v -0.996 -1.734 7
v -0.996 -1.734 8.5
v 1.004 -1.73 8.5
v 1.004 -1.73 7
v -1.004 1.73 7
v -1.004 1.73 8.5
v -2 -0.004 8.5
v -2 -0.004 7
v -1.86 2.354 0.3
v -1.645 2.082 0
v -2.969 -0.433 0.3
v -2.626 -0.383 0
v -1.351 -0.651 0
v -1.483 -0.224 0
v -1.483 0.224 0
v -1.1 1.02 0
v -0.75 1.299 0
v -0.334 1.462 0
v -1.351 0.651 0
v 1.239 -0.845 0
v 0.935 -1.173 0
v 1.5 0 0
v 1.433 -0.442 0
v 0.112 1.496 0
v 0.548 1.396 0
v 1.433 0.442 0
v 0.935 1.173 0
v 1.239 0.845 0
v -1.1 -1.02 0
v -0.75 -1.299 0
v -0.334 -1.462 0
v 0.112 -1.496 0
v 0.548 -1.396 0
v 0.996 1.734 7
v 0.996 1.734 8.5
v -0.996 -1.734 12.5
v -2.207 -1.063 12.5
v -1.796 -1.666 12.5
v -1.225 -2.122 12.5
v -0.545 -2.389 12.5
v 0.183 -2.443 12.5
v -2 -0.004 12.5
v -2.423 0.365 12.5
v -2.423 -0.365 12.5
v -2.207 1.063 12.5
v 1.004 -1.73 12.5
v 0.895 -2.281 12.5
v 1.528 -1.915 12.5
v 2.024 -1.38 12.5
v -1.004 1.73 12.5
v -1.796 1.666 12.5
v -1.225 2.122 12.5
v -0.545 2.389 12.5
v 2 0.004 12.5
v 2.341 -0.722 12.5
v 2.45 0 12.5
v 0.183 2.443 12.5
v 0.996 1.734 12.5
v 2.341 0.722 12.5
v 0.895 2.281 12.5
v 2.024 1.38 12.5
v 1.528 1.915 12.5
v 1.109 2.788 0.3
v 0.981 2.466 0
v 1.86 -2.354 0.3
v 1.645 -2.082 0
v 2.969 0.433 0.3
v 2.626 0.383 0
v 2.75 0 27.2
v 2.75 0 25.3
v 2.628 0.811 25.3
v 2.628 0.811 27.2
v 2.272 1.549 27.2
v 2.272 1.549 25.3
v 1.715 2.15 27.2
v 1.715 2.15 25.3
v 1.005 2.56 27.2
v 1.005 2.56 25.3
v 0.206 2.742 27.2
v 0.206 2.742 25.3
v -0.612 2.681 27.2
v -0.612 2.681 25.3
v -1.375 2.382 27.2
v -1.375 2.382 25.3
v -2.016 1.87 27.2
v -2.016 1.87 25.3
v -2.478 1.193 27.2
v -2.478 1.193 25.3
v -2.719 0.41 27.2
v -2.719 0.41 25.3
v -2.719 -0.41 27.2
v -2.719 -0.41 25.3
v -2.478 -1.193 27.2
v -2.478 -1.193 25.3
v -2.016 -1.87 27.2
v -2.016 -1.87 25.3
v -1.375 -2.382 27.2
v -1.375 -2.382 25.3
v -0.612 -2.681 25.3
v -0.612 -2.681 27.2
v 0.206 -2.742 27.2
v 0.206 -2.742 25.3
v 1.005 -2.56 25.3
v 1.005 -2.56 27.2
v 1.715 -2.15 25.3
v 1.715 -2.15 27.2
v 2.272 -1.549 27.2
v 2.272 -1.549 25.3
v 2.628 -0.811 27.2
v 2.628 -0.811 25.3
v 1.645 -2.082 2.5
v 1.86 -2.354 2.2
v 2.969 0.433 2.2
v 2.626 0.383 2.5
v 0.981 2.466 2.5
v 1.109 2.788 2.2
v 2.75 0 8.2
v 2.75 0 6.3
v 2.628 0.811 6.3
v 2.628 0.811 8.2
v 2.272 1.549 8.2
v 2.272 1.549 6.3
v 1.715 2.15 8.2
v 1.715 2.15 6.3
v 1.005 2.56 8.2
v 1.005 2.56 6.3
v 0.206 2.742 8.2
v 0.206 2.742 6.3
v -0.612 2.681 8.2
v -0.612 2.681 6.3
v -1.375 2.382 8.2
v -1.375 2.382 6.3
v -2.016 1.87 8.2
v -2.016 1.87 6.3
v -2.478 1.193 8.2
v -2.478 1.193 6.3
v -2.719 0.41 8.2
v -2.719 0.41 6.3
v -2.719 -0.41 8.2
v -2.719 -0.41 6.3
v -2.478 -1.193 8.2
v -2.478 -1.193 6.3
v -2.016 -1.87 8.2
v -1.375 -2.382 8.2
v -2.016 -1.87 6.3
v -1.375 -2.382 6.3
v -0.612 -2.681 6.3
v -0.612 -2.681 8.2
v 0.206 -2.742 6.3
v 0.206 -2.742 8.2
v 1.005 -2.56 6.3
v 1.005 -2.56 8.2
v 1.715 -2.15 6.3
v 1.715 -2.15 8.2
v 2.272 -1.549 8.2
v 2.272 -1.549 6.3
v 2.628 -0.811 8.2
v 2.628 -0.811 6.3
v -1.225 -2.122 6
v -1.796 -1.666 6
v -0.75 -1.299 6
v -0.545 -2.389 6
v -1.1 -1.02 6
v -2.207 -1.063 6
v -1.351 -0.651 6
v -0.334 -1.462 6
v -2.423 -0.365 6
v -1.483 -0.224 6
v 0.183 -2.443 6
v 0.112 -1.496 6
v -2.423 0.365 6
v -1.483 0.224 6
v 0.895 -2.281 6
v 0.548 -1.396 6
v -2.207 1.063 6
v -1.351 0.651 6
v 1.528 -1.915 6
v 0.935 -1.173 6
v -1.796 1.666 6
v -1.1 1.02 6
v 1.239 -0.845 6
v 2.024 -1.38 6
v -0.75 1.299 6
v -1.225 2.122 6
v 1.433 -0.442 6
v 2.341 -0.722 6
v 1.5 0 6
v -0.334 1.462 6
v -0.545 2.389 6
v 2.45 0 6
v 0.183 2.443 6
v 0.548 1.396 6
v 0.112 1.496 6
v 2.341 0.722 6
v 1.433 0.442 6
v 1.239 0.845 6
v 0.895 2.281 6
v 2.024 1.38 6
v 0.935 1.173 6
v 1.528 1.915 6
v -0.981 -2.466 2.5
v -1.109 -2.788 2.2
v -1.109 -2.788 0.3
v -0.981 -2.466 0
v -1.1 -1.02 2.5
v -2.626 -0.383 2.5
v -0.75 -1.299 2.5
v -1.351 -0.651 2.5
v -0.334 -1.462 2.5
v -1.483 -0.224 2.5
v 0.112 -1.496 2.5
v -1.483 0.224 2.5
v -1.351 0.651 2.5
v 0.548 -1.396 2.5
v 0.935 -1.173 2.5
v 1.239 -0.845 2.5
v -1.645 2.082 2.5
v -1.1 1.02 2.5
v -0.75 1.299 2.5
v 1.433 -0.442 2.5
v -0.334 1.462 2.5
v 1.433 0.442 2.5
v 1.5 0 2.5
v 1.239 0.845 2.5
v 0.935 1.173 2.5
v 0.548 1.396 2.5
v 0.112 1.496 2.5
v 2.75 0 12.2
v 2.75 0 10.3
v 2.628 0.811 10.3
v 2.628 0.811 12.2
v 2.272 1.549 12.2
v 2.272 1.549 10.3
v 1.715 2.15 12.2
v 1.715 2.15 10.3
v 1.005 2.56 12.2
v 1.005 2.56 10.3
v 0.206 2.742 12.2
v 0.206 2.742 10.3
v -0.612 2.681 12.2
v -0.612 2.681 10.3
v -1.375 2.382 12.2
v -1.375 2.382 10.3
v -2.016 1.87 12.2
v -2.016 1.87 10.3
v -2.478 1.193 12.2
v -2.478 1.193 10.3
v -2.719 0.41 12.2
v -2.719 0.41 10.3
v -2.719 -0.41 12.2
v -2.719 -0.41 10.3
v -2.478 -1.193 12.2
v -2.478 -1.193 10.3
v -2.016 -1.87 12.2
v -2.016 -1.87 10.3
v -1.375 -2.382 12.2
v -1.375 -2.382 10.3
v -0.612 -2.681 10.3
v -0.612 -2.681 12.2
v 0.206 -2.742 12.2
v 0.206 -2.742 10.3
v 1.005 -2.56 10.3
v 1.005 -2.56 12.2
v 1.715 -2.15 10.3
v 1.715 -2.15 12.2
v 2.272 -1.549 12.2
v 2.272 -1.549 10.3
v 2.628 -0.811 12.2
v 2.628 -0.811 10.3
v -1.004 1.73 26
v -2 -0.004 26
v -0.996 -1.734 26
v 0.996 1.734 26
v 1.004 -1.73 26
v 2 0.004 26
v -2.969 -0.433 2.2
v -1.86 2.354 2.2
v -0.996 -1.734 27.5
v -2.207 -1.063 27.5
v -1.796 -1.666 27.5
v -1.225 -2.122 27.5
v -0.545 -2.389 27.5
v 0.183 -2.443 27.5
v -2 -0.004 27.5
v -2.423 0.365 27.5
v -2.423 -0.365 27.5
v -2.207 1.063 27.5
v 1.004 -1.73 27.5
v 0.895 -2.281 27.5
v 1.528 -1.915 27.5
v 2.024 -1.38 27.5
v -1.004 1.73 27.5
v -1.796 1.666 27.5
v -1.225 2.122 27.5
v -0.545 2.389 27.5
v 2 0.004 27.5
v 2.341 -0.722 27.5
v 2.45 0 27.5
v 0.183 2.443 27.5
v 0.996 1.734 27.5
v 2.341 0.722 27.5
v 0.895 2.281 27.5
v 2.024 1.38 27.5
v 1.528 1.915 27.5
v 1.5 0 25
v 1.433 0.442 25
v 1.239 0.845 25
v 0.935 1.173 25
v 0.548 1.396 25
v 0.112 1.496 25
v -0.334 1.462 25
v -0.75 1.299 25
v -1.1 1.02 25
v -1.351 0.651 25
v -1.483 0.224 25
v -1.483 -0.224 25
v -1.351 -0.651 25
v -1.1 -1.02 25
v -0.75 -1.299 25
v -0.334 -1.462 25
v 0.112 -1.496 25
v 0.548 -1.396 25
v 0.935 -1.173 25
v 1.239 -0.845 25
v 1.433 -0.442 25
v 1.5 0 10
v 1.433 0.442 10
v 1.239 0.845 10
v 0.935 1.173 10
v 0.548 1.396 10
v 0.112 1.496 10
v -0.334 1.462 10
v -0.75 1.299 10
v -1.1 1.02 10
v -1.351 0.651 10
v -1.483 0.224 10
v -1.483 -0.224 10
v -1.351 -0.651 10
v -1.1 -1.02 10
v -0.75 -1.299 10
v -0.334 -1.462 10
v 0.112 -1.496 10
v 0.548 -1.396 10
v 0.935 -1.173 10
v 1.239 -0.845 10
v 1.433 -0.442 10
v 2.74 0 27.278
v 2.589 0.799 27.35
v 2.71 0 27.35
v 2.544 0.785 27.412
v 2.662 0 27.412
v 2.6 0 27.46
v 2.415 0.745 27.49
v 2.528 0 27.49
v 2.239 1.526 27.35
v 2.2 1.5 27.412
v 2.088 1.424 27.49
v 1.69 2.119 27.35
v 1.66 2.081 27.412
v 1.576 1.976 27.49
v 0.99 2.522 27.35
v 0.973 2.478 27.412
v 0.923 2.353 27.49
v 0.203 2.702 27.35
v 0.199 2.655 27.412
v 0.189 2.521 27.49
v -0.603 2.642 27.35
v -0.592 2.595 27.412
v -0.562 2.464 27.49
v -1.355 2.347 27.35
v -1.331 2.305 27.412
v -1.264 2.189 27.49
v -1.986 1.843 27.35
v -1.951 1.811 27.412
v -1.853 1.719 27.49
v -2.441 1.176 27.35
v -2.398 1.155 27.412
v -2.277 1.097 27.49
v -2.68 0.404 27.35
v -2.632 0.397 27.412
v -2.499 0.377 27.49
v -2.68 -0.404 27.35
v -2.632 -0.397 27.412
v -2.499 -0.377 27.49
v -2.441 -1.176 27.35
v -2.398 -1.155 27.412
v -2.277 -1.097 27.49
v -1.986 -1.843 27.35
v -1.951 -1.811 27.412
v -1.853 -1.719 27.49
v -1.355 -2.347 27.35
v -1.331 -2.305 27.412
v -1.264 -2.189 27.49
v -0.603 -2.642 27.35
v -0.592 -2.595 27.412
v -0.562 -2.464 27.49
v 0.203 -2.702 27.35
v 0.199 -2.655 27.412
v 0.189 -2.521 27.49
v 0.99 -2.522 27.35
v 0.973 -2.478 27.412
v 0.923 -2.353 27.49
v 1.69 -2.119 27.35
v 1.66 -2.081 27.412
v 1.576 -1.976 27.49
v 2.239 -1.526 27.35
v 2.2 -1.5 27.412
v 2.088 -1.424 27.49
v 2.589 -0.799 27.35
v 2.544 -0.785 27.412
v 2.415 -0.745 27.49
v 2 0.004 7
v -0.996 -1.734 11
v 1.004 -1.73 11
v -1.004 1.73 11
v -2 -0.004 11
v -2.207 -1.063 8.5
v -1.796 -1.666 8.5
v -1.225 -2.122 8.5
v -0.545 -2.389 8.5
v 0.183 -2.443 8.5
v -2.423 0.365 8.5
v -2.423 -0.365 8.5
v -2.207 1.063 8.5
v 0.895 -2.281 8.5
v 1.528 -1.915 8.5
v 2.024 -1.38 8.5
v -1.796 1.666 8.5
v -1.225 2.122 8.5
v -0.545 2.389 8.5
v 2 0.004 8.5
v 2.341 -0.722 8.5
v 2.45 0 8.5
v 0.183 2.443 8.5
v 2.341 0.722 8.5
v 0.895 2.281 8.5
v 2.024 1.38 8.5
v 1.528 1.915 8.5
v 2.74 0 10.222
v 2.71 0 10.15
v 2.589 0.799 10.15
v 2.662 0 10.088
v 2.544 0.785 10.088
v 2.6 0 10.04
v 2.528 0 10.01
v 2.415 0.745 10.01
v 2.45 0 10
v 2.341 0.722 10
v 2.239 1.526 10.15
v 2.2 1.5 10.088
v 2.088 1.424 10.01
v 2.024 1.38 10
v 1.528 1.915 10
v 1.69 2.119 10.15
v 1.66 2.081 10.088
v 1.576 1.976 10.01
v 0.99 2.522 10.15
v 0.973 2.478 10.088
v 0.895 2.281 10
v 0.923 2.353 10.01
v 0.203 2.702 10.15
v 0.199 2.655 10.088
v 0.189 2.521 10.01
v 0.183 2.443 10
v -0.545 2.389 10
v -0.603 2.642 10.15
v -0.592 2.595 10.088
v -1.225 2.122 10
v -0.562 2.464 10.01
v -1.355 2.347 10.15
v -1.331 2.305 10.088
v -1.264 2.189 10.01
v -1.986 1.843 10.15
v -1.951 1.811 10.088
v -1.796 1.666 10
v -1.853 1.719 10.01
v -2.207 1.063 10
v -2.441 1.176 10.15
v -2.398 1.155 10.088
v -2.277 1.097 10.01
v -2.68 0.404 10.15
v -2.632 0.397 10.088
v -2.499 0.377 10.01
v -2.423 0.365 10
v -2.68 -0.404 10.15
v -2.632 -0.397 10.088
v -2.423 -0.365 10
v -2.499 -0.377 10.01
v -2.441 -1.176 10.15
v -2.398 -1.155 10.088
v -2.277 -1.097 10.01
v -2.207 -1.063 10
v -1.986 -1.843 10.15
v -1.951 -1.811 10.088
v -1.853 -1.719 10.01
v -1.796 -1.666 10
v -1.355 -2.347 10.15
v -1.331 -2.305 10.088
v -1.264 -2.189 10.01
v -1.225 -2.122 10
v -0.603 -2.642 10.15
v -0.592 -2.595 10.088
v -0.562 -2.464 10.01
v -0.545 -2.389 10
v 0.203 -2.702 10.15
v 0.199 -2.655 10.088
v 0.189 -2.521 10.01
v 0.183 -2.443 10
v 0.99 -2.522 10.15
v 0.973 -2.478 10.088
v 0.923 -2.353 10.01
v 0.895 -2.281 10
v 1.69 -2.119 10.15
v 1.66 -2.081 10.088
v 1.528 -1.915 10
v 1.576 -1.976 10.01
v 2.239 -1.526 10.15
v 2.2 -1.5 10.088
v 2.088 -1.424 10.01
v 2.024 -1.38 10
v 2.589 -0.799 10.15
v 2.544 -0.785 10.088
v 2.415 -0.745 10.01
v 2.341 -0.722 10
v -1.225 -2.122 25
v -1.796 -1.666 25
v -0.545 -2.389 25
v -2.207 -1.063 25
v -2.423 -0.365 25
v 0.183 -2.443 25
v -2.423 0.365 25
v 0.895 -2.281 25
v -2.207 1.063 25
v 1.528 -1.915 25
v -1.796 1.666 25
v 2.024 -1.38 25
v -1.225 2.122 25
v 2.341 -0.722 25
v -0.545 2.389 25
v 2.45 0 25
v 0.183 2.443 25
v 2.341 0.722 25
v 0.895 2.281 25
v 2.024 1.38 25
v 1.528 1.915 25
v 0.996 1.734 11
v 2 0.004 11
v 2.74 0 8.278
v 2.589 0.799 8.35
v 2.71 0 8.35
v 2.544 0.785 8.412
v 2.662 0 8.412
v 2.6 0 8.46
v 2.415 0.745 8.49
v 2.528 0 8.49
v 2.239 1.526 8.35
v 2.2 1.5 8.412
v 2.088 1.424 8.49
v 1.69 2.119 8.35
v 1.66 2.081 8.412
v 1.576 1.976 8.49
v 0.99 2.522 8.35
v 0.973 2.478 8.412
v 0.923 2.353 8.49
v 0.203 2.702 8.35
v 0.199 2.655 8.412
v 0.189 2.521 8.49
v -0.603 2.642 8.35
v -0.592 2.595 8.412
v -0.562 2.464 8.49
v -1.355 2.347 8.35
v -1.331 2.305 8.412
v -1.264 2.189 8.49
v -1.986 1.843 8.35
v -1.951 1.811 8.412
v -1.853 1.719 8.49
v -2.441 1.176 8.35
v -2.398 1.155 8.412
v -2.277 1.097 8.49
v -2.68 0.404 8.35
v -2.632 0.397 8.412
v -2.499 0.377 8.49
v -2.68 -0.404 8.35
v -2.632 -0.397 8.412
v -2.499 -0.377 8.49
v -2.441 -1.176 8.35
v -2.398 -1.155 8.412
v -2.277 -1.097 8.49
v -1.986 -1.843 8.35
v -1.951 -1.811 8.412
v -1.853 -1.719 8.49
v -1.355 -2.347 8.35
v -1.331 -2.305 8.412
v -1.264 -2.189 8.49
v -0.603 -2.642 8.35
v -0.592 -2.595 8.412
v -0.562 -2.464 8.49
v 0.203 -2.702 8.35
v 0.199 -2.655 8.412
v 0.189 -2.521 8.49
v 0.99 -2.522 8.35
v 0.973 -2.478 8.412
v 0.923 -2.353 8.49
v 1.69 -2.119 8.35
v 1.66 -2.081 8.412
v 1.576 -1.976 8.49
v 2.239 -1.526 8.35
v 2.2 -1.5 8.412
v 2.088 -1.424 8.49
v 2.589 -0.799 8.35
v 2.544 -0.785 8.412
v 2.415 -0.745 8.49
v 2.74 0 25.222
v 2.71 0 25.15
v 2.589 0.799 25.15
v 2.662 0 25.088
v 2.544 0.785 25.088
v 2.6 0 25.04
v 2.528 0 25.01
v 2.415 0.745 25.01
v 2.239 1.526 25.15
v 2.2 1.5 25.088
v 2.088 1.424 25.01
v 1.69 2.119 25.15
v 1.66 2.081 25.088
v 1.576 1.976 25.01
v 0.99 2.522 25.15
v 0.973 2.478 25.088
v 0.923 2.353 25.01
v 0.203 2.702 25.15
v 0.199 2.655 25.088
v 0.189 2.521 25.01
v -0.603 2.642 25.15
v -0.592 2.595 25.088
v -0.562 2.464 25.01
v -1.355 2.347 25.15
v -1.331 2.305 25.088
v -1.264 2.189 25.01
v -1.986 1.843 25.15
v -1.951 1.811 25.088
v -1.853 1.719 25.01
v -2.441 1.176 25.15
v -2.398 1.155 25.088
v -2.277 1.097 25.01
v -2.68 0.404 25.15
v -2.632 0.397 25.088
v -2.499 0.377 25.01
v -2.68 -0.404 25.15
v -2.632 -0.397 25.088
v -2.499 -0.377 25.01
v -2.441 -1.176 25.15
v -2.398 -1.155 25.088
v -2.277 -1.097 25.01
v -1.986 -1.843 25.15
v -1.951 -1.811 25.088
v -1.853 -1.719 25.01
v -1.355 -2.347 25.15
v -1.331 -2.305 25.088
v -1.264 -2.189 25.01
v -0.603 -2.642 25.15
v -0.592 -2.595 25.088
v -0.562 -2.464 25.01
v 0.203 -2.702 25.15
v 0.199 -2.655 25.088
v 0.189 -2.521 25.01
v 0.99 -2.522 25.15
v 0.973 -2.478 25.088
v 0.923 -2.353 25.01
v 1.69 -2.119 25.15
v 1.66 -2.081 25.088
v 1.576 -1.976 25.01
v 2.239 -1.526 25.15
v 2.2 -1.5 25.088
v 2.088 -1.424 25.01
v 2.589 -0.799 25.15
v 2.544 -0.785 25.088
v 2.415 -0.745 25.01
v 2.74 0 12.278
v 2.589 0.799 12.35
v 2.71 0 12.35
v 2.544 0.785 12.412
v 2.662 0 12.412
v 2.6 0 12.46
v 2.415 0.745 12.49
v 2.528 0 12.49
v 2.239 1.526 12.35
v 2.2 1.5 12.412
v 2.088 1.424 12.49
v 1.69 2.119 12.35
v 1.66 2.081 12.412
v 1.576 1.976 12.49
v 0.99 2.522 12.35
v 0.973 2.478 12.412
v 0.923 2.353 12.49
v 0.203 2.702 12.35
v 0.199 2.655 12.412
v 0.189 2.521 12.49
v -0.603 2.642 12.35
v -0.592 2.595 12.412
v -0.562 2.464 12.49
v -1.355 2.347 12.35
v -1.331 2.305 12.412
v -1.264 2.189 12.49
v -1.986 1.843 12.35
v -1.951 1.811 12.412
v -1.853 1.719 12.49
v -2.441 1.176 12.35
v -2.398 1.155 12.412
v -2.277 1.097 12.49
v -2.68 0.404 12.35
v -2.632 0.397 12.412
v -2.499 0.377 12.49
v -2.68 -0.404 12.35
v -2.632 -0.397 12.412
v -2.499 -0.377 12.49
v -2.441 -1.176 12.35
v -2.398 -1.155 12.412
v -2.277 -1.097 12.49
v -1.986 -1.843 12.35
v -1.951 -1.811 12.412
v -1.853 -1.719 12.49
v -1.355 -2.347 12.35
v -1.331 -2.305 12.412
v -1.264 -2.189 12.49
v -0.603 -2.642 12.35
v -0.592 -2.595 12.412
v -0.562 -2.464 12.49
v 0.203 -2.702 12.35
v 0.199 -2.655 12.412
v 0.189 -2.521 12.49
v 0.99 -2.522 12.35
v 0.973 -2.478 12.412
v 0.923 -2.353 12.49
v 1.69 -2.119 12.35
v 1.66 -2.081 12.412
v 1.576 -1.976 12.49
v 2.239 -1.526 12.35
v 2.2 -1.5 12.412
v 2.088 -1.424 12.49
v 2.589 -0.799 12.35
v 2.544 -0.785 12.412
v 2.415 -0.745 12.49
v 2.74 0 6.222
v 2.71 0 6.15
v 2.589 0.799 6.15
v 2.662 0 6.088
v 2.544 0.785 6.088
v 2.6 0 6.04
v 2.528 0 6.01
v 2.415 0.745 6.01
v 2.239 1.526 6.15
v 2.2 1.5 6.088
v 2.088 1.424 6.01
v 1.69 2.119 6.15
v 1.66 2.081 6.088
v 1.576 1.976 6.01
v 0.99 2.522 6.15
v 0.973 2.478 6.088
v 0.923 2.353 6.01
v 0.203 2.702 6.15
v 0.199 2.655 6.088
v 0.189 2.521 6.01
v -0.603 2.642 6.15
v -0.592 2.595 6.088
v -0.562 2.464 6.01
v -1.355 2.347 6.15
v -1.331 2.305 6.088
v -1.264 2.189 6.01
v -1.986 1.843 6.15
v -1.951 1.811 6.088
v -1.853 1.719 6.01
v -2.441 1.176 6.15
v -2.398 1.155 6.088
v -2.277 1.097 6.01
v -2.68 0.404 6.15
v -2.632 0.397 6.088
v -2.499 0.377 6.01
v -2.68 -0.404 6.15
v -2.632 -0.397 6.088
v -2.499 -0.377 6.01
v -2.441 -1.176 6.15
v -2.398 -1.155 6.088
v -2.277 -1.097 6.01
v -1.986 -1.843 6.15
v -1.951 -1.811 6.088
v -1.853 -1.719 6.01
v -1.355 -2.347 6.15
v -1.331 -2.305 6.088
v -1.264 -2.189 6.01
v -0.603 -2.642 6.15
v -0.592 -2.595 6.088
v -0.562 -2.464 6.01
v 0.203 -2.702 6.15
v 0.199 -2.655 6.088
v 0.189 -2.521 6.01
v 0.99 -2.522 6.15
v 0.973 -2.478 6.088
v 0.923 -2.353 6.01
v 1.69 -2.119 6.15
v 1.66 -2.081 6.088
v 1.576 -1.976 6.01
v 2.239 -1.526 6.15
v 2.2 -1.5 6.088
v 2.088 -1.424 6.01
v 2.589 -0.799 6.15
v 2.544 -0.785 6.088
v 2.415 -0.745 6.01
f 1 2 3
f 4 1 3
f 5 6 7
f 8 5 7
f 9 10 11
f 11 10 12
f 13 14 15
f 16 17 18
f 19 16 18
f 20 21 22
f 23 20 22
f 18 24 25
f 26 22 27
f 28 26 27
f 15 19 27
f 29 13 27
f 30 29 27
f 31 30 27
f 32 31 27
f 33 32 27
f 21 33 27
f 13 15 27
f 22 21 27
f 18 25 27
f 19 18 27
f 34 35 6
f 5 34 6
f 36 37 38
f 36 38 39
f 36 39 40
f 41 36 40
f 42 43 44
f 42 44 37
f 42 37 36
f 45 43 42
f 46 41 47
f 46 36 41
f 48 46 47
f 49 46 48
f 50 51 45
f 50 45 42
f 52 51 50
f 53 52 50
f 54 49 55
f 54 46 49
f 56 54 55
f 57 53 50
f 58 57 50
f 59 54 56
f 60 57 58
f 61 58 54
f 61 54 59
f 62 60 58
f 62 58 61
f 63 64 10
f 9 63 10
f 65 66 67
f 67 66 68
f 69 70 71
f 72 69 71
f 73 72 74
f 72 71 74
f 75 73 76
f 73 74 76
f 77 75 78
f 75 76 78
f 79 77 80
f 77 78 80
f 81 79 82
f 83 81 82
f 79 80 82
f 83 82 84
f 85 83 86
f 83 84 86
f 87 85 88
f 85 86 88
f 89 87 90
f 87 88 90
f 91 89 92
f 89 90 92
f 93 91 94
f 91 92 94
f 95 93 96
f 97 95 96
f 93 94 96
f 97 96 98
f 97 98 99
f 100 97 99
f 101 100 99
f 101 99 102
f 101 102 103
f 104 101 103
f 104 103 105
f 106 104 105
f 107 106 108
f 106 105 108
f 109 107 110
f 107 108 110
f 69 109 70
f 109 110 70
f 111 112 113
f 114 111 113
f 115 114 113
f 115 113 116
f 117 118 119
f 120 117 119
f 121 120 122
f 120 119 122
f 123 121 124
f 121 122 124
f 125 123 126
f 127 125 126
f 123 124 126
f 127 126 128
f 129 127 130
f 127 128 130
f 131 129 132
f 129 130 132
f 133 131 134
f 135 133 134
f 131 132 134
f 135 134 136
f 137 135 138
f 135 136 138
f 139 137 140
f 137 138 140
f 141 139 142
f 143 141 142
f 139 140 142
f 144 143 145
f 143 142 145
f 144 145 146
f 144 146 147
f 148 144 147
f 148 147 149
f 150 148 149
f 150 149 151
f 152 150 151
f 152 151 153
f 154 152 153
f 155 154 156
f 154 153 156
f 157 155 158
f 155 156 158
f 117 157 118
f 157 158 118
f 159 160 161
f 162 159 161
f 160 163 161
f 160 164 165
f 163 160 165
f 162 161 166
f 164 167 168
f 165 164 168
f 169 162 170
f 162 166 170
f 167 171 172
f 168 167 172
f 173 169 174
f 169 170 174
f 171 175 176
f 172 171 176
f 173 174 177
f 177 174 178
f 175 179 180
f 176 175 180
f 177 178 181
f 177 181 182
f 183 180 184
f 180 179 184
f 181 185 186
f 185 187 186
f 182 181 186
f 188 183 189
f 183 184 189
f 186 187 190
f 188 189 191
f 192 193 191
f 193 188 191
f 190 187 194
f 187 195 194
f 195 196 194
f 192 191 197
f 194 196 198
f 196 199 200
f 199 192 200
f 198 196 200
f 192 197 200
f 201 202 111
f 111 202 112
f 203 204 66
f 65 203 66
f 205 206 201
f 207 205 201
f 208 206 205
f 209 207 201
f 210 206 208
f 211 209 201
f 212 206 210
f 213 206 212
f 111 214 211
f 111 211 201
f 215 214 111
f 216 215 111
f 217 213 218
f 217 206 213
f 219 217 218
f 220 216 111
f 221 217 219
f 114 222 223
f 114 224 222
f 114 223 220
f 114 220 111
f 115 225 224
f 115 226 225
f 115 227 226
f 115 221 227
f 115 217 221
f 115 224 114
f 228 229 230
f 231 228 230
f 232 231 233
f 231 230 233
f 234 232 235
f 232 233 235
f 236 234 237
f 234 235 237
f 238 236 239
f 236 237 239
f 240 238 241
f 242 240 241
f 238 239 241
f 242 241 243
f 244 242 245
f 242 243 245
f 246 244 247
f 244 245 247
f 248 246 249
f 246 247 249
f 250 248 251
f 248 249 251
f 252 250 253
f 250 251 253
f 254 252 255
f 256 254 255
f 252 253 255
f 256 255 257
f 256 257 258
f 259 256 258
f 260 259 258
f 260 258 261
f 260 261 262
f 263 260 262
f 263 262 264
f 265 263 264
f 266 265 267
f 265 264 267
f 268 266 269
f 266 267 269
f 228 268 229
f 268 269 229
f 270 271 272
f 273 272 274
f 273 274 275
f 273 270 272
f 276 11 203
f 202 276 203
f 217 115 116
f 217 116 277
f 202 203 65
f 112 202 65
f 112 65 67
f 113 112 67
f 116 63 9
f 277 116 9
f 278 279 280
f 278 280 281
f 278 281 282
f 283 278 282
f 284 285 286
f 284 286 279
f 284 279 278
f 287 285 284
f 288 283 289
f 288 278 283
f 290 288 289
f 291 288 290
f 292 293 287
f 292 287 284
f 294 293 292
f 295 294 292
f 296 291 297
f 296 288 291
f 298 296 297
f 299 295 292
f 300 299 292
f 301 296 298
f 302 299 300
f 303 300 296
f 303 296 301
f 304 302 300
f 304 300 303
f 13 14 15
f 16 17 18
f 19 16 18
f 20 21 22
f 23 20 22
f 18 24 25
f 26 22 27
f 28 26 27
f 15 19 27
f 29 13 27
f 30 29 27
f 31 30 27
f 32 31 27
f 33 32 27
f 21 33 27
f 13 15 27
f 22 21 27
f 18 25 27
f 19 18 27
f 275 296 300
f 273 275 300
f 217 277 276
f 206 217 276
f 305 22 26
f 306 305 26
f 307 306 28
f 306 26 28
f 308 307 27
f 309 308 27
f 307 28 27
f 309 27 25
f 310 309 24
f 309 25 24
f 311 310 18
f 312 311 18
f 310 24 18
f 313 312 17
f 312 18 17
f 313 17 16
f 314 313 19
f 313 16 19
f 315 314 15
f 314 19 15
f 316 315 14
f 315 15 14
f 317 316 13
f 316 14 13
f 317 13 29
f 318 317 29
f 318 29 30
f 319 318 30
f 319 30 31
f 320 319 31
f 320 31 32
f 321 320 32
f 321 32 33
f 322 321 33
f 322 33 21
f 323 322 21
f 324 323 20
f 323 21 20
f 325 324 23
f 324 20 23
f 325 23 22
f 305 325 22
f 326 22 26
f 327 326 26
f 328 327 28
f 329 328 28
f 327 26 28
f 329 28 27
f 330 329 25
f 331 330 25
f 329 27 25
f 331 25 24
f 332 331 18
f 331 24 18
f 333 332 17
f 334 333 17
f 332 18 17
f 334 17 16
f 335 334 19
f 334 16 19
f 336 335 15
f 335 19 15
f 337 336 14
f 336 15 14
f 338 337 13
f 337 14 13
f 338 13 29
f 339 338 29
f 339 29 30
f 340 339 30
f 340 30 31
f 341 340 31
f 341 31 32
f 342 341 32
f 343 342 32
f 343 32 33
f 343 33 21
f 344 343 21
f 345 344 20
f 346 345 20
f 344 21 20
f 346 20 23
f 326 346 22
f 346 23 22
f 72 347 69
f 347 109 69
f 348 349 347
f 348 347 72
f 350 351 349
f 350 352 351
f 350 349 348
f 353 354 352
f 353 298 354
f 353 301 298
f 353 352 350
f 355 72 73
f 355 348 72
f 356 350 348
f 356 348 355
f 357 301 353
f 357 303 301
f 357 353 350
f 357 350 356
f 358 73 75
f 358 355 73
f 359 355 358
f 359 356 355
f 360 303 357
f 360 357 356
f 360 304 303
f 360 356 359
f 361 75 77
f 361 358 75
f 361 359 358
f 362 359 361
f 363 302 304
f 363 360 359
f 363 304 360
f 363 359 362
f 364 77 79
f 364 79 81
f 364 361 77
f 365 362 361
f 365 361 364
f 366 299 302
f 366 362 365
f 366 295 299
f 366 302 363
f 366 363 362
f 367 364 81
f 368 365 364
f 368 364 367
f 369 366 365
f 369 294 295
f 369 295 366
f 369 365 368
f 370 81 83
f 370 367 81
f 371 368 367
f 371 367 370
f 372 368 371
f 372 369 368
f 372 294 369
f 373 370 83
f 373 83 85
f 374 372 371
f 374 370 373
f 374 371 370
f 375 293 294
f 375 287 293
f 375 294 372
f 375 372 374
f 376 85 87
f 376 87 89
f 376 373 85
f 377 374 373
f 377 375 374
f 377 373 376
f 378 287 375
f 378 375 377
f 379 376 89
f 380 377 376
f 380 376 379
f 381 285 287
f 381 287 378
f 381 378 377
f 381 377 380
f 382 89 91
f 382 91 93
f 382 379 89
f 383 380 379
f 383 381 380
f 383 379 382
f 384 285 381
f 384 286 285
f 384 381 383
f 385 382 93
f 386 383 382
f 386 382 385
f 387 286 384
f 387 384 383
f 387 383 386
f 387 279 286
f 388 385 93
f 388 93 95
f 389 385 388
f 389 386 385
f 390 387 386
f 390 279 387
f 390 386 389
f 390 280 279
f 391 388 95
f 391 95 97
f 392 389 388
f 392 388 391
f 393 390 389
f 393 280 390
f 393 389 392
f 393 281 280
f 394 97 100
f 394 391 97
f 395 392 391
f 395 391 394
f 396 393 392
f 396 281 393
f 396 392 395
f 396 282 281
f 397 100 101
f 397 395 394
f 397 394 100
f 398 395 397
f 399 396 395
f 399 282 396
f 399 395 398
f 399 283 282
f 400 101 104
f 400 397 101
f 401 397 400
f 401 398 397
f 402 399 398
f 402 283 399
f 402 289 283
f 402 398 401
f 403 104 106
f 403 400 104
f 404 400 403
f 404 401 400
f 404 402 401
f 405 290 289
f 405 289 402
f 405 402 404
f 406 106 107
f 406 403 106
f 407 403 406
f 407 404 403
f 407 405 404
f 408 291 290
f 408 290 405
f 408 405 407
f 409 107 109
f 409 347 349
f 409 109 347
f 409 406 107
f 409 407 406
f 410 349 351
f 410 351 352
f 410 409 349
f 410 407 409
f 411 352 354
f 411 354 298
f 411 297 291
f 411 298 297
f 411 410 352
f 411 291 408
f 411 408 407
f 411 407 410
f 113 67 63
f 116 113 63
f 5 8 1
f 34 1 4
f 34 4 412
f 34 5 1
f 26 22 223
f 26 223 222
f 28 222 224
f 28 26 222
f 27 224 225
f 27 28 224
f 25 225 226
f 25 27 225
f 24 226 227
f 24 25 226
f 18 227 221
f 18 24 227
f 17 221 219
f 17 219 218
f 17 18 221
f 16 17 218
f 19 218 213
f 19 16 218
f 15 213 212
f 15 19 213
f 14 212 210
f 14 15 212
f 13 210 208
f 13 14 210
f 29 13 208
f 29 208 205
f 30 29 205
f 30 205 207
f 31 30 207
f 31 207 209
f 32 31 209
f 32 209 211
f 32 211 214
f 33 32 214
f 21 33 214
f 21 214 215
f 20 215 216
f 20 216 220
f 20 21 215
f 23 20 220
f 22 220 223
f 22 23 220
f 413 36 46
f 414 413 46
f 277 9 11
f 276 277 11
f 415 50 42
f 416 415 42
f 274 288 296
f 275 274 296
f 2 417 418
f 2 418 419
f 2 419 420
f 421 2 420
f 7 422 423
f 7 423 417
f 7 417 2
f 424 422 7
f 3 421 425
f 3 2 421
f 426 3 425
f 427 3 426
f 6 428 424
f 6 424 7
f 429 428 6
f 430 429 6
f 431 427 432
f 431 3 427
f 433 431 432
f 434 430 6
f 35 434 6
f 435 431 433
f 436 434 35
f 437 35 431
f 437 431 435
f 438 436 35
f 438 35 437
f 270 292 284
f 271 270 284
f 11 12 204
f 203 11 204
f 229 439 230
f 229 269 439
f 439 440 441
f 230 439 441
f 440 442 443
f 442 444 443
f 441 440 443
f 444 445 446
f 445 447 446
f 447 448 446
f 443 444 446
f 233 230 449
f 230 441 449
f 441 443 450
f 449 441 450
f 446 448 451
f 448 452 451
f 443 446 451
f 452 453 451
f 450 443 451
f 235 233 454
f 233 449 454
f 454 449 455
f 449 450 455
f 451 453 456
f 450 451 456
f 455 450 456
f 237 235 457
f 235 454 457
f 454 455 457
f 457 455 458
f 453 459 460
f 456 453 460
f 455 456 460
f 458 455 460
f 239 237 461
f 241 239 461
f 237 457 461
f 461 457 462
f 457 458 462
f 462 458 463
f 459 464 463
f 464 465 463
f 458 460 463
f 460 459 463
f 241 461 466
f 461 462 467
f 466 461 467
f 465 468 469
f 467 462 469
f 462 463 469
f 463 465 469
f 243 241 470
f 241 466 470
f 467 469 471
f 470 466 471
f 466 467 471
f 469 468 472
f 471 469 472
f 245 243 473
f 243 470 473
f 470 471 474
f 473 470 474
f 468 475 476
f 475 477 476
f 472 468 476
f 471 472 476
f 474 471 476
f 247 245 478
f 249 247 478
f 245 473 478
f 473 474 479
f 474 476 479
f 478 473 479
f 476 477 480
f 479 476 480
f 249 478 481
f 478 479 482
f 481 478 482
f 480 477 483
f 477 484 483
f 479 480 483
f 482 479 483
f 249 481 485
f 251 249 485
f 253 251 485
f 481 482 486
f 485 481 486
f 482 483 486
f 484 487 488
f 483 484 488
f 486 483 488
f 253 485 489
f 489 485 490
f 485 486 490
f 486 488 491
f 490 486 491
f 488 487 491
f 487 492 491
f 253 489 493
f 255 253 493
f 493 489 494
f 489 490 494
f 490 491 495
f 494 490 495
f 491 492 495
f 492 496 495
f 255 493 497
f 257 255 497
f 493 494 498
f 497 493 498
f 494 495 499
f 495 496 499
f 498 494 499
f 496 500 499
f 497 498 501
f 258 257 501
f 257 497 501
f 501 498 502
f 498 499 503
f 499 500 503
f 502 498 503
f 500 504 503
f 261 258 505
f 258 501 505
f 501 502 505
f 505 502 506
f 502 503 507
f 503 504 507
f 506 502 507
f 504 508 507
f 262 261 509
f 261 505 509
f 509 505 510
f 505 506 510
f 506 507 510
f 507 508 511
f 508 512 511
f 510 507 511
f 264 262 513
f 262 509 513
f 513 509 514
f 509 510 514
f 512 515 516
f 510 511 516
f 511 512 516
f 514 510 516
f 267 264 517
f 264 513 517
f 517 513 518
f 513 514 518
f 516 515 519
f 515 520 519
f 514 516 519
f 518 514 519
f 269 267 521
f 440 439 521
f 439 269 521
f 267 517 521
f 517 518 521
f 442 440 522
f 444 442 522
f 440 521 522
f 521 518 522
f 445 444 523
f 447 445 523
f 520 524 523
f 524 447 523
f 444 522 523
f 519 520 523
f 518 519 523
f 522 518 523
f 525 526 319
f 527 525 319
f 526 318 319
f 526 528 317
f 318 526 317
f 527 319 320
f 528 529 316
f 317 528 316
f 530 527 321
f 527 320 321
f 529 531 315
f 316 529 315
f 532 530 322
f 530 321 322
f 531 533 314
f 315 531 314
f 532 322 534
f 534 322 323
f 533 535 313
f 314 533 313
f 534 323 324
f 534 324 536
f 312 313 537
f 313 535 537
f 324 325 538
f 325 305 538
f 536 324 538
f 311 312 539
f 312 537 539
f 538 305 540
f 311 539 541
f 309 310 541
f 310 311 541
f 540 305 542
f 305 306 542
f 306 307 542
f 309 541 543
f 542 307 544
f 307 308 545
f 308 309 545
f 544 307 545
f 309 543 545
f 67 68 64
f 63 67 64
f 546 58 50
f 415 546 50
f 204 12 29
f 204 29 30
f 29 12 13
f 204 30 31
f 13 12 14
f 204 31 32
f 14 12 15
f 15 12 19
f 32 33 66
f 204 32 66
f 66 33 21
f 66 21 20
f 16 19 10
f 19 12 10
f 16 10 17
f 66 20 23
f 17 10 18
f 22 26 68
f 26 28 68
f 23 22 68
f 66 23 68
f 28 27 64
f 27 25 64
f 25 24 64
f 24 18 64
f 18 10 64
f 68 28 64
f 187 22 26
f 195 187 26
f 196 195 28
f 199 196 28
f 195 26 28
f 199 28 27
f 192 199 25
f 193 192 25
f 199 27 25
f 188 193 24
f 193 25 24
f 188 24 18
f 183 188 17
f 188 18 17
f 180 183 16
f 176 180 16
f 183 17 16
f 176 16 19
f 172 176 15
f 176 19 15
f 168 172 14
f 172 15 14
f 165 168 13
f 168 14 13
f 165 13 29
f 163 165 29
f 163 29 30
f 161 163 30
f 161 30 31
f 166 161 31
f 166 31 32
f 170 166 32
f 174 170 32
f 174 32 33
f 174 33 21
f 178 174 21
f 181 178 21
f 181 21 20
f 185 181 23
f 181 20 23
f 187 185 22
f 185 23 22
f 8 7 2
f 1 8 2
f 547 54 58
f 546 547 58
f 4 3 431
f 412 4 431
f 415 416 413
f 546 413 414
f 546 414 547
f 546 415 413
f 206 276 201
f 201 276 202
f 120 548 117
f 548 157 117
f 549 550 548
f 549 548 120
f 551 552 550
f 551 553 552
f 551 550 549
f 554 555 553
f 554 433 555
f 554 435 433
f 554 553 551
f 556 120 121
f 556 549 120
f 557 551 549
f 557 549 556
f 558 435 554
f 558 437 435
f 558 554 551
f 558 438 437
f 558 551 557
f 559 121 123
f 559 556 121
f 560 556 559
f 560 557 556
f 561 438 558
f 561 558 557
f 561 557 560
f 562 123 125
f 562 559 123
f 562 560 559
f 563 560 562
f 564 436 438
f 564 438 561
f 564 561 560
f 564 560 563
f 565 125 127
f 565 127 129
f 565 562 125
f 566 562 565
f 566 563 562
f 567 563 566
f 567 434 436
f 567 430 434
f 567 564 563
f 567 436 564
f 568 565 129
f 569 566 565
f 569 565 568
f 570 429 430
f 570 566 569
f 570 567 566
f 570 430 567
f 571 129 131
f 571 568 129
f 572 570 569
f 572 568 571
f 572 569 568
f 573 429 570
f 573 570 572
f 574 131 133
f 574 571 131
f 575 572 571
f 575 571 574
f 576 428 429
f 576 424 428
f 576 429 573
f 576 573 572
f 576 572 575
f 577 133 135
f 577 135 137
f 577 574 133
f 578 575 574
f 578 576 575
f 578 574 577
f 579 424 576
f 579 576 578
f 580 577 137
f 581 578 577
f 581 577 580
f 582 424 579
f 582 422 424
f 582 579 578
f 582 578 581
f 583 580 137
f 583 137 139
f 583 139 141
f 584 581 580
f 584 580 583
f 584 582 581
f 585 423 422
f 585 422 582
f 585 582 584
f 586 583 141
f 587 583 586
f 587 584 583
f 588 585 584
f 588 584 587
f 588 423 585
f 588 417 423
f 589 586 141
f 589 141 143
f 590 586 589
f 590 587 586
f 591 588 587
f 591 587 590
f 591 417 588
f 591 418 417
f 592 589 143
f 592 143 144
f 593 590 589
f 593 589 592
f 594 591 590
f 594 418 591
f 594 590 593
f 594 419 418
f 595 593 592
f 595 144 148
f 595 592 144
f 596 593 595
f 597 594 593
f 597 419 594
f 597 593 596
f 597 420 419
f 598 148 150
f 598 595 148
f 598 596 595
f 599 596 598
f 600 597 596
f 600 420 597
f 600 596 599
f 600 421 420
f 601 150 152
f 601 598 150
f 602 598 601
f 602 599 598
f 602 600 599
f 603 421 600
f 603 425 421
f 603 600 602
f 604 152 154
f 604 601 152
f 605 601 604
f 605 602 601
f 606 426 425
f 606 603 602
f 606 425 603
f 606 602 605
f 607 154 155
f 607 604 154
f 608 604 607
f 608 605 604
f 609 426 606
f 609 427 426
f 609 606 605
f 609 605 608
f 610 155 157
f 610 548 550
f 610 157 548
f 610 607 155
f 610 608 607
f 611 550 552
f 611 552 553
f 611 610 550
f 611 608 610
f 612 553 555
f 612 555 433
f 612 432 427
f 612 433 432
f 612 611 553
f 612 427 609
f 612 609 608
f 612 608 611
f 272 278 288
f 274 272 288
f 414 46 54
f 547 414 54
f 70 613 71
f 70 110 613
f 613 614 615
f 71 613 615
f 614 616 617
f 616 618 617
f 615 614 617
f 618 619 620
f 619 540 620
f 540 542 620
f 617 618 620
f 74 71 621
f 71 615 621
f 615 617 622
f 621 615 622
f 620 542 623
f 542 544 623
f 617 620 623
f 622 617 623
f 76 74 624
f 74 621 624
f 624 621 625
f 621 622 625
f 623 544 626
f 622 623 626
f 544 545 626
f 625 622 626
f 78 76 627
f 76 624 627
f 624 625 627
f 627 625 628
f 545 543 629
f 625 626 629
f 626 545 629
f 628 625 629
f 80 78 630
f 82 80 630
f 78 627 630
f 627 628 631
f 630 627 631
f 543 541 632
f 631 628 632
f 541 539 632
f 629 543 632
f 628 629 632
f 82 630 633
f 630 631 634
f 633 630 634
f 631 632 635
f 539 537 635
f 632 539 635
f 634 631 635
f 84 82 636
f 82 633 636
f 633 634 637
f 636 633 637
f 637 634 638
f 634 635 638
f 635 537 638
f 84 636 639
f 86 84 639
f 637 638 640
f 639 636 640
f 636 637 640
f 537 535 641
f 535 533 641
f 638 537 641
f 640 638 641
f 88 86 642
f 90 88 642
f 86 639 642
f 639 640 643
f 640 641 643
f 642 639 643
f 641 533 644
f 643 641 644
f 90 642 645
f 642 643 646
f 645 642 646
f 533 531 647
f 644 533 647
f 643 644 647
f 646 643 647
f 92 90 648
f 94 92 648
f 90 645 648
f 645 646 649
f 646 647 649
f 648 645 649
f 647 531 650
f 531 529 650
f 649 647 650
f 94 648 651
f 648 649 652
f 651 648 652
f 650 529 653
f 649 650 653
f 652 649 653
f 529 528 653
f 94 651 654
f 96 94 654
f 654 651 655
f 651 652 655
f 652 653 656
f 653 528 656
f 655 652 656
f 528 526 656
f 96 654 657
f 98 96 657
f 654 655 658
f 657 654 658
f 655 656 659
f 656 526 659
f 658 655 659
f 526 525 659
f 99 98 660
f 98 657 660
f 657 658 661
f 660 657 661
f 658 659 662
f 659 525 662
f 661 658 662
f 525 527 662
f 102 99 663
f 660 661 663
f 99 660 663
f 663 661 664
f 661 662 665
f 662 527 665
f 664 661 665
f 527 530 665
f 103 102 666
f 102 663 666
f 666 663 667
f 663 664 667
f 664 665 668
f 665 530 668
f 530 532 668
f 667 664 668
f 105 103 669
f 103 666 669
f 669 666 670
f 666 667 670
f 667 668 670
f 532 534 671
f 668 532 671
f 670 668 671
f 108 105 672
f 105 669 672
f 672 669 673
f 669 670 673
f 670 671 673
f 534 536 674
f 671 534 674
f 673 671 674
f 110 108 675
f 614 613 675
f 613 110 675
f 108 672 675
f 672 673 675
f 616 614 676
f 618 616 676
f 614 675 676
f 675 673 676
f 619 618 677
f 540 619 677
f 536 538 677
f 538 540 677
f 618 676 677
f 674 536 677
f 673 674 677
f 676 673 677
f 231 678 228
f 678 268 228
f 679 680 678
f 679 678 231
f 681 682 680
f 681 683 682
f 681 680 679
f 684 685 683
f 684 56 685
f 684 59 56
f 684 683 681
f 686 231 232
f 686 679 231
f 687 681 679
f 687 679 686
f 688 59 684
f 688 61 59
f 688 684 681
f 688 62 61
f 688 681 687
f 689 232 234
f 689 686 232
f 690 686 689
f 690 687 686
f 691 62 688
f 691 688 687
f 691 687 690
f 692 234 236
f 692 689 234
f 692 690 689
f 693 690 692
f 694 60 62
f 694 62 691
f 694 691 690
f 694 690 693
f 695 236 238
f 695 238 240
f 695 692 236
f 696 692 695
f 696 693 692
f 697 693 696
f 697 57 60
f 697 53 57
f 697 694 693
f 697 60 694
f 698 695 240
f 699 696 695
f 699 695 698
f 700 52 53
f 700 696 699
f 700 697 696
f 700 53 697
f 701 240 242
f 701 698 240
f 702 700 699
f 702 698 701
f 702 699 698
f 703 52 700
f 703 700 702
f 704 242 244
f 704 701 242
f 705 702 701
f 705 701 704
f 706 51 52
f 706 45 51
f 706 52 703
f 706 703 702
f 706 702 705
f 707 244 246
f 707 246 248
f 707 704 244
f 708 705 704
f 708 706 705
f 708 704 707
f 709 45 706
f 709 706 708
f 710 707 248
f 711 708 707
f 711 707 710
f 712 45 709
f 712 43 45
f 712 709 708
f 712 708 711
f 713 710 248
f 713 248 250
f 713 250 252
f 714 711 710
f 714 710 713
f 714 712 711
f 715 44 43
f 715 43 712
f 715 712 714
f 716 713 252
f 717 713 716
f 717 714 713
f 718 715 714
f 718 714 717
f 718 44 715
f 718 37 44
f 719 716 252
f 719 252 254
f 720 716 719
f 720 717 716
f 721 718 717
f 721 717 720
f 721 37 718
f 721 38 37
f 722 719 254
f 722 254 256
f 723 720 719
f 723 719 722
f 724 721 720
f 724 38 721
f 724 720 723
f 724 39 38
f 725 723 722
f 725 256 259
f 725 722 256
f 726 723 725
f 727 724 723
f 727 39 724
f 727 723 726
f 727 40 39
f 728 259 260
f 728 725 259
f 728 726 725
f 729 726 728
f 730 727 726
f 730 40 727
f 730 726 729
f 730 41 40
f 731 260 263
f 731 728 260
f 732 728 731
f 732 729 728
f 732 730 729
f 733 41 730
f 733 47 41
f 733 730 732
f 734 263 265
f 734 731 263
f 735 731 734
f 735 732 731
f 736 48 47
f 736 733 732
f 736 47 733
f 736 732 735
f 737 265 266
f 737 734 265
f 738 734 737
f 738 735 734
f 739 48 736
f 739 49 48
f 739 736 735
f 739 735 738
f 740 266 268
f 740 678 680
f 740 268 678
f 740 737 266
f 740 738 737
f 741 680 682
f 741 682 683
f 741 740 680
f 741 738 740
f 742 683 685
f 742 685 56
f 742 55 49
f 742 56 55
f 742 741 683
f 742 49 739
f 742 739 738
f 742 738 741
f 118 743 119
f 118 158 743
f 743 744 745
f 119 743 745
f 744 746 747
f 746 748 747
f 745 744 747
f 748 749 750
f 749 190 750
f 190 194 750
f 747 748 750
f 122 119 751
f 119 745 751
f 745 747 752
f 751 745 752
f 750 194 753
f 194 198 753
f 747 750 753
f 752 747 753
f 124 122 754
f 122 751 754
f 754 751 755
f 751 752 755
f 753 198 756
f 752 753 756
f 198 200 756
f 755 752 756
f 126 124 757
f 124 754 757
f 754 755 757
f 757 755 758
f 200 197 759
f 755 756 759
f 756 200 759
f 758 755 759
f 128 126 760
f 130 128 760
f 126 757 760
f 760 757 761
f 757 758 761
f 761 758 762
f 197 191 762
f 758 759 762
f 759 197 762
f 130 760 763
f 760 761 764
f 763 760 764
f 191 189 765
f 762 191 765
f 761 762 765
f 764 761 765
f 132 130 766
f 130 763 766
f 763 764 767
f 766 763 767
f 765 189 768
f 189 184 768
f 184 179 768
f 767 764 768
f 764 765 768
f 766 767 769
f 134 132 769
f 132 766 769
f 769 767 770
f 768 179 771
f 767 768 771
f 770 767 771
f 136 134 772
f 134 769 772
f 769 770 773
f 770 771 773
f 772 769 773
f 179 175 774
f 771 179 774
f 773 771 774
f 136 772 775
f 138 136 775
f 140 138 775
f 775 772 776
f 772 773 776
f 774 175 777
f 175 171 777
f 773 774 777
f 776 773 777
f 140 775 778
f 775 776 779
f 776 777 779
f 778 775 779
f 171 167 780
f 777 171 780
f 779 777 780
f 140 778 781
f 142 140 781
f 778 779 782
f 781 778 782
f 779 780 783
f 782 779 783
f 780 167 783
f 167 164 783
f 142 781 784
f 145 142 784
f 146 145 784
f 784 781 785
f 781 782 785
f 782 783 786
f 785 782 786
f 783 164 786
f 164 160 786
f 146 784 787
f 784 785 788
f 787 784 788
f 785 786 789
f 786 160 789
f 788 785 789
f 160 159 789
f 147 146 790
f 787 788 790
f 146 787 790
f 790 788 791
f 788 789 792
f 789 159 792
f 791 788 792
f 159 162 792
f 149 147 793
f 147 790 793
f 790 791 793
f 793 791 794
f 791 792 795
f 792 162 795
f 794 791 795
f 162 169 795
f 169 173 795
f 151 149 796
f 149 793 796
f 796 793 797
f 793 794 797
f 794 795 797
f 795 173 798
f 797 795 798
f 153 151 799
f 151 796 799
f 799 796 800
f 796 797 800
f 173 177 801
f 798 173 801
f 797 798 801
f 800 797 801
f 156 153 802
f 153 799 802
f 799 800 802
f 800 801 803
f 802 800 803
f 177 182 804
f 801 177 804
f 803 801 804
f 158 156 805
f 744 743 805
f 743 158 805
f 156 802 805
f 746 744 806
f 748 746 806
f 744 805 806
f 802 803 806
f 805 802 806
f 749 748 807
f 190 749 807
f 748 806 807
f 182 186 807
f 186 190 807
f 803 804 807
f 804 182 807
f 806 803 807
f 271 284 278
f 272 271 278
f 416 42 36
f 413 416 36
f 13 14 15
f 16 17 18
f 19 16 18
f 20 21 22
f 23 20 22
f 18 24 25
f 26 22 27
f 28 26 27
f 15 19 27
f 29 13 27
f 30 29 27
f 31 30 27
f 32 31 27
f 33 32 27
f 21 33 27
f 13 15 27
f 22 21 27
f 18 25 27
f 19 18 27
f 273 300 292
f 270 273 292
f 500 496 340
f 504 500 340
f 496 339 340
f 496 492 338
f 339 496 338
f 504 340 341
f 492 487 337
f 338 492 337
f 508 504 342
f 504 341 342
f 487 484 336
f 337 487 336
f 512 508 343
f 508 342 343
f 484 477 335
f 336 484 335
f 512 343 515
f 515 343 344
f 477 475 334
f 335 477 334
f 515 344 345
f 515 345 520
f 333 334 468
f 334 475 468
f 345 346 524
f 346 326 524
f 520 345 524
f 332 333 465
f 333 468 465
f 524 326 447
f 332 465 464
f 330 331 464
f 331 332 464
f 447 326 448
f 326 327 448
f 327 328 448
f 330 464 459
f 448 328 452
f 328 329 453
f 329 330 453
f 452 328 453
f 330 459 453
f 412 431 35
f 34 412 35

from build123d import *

# Parameters (mm, degrees)
SKETCH_R        = 1.5
PAD_DEPTH       = 10
SKETCH001_R     = 2.75
PAD001_DEPTH    = 2.5
POCKET_DEPTH    = 1.5
FILLET_R        = 0.3
SKETCH004_R     = 1.5
PAD002_DEPTH    = 2.5
CHAMFER001_SIZE = 0.3
CHAMFER002_SIZE = 0.3
SKETCH005_R     = 1.5
PAD004_DEPTH    = 6
SKETCH006_R     = 2.75
PAD003_DEPTH    = 2.5
POCKET001_DEPTH = 1.5
FILLET001_R     = 0.3
SKETCH008_R     = 1.5
PAD006_DEPTH    = 25
SKETCH009_R     = 2.75
PAD005_DEPTH    = 2.5
POCKET002_DEPTH = 1.5
FILLET002_R     = 0.3


with BuildPart() as m3_10mm:
    # Sketch → Pad (new body)
    with BuildSketch(Plane.XY):
        Circle(SKETCH_R)
    extrude(amount=PAD_DEPTH)

    # Sketch001 (on Face3 of Pad) → Pad001 (join)
    with BuildSketch(Plane.XY.offset(10)):
        Circle(SKETCH001_R)
    extrude(amount=PAD001_DEPTH)

    # Sketch002 (on Face3 of Pad001) → Pocket (cut)
    with BuildSketch(Plane.XY.offset(12.5)):
        Polygon((1.999996, 0.004094), (0.996452, 1.734094), (-1.003544, 1.73), (-1.999996, -0.004094), (-0.996452, -1.734094), (1.003544, -1.73), align=None)
    extrude(amount=-POCKET_DEPTH, mode=Mode.SUBTRACT)

    # Fillet
    fillet_edges = [m3_10mm.edges().sort_by_distance(p)[0] for p in [
        (-2.75, 0, 12.5),
        (-2.75, 0, 10),
    ]]
    fillet(fillet_edges, radius=FILLET_R)


with BuildPart() as m3_nut:
    # Sketch004 → Pad002 (new body)
    with BuildSketch(Plane.XY):
        Polygon((1.108956, 2.787511), (-1.859577, 2.35414), (-2.968533, -0.433371), (-1.108956, -2.787511), (1.859577, -2.35414), (2.968533, 0.433371), align=None)
        Circle(SKETCH004_R, mode=Mode.SUBTRACT)
    extrude(amount=PAD002_DEPTH)

    # Chamfer001
    chamfer001_edges = [m3_nut.edges().sort_by_distance(p)[0] for p in [
        (-2.038745, -1.610441, 0),
        (0.37531, -2.570825, 0),
        (2.414055, -0.960384, 0),
        (2.038745, 1.610441, 0),
        (-0.37531, 2.570825, 0),
        (-2.414055, 0.960384, 0),
    ]]
    chamfer(chamfer001_edges, length=CHAMFER001_SIZE)

    # Chamfer002
    chamfer002_edges = [m3_nut.edges().sort_by_distance(p)[0] for p in [
        (0.37531, -2.570825, 2.5),
        (-2.038745, -1.610441, 2.5),
        (-2.414055, 0.960384, 2.5),
        (-0.37531, 2.570825, 2.5),
        (2.038745, 1.610441, 2.5),
        (2.414055, -0.960384, 2.5),
    ]]
    chamfer(chamfer002_edges, length=CHAMFER002_SIZE)


with BuildPart() as m3_6mm:
    # Sketch005 → Pad004 (new body)
    with BuildSketch(Plane.XY):
        Circle(SKETCH005_R)
    extrude(amount=PAD004_DEPTH)

    # Sketch006 (on Face3 of Pad004) → Pad003 (join)
    with BuildSketch(Plane.XY.offset(6)):
        Circle(SKETCH006_R)
    extrude(amount=PAD003_DEPTH)

    # Sketch007 (on Face3 of Pad003) → Pocket001 (cut)
    with BuildSketch(Plane.XY.offset(8.5)):
        Polygon((1.999996, 0.004094), (0.996452, 1.734094), (-1.003544, 1.73), (-1.999996, -0.004094), (-0.996452, -1.734094), (1.003544, -1.73), align=None)
    extrude(amount=-POCKET001_DEPTH, mode=Mode.SUBTRACT)

    # Fillet001
    fillet001_edges = [m3_6mm.edges().sort_by_distance(p)[0] for p in [
        (-2.75, 0, 8.5),
        (-2.75, 0, 6),
    ]]
    fillet(fillet001_edges, radius=FILLET001_R)


with BuildPart() as m3_25mm:
    # Sketch008 → Pad006 (new body)
    with BuildSketch(Plane.XY):
        Circle(SKETCH008_R)
    extrude(amount=PAD006_DEPTH)

    # Sketch009 (on Face3 of Pad006) → Pad005 (join)
    with BuildSketch(Plane.XY.offset(25)):
        Circle(SKETCH009_R)
    extrude(amount=PAD005_DEPTH)

    # Sketch010 (on Face3 of Pad005) → Pocket002 (cut)
    with BuildSketch(Plane.XY.offset(27.5)):
        Polygon((1.999996, 0.004094), (0.996452, 1.734094), (-1.003544, 1.73), (-1.999996, -0.004094), (-0.996452, -1.734094), (1.003544, -1.73), align=None)
    extrude(amount=-POCKET002_DEPTH, mode=Mode.SUBTRACT)

    # Fillet002
    fillet002_edges = [m3_25mm.edges().sort_by_distance(p)[0] for p in [
        (-2.75, 0, 27.5),
        (-2.75, 0, 25),
    ]]
    fillet(fillet002_edges, radius=FILLET002_R)


solid = Compound([m3_10mm.part, m3_nut.part, m3_6mm.part, m3_25mm.part])
